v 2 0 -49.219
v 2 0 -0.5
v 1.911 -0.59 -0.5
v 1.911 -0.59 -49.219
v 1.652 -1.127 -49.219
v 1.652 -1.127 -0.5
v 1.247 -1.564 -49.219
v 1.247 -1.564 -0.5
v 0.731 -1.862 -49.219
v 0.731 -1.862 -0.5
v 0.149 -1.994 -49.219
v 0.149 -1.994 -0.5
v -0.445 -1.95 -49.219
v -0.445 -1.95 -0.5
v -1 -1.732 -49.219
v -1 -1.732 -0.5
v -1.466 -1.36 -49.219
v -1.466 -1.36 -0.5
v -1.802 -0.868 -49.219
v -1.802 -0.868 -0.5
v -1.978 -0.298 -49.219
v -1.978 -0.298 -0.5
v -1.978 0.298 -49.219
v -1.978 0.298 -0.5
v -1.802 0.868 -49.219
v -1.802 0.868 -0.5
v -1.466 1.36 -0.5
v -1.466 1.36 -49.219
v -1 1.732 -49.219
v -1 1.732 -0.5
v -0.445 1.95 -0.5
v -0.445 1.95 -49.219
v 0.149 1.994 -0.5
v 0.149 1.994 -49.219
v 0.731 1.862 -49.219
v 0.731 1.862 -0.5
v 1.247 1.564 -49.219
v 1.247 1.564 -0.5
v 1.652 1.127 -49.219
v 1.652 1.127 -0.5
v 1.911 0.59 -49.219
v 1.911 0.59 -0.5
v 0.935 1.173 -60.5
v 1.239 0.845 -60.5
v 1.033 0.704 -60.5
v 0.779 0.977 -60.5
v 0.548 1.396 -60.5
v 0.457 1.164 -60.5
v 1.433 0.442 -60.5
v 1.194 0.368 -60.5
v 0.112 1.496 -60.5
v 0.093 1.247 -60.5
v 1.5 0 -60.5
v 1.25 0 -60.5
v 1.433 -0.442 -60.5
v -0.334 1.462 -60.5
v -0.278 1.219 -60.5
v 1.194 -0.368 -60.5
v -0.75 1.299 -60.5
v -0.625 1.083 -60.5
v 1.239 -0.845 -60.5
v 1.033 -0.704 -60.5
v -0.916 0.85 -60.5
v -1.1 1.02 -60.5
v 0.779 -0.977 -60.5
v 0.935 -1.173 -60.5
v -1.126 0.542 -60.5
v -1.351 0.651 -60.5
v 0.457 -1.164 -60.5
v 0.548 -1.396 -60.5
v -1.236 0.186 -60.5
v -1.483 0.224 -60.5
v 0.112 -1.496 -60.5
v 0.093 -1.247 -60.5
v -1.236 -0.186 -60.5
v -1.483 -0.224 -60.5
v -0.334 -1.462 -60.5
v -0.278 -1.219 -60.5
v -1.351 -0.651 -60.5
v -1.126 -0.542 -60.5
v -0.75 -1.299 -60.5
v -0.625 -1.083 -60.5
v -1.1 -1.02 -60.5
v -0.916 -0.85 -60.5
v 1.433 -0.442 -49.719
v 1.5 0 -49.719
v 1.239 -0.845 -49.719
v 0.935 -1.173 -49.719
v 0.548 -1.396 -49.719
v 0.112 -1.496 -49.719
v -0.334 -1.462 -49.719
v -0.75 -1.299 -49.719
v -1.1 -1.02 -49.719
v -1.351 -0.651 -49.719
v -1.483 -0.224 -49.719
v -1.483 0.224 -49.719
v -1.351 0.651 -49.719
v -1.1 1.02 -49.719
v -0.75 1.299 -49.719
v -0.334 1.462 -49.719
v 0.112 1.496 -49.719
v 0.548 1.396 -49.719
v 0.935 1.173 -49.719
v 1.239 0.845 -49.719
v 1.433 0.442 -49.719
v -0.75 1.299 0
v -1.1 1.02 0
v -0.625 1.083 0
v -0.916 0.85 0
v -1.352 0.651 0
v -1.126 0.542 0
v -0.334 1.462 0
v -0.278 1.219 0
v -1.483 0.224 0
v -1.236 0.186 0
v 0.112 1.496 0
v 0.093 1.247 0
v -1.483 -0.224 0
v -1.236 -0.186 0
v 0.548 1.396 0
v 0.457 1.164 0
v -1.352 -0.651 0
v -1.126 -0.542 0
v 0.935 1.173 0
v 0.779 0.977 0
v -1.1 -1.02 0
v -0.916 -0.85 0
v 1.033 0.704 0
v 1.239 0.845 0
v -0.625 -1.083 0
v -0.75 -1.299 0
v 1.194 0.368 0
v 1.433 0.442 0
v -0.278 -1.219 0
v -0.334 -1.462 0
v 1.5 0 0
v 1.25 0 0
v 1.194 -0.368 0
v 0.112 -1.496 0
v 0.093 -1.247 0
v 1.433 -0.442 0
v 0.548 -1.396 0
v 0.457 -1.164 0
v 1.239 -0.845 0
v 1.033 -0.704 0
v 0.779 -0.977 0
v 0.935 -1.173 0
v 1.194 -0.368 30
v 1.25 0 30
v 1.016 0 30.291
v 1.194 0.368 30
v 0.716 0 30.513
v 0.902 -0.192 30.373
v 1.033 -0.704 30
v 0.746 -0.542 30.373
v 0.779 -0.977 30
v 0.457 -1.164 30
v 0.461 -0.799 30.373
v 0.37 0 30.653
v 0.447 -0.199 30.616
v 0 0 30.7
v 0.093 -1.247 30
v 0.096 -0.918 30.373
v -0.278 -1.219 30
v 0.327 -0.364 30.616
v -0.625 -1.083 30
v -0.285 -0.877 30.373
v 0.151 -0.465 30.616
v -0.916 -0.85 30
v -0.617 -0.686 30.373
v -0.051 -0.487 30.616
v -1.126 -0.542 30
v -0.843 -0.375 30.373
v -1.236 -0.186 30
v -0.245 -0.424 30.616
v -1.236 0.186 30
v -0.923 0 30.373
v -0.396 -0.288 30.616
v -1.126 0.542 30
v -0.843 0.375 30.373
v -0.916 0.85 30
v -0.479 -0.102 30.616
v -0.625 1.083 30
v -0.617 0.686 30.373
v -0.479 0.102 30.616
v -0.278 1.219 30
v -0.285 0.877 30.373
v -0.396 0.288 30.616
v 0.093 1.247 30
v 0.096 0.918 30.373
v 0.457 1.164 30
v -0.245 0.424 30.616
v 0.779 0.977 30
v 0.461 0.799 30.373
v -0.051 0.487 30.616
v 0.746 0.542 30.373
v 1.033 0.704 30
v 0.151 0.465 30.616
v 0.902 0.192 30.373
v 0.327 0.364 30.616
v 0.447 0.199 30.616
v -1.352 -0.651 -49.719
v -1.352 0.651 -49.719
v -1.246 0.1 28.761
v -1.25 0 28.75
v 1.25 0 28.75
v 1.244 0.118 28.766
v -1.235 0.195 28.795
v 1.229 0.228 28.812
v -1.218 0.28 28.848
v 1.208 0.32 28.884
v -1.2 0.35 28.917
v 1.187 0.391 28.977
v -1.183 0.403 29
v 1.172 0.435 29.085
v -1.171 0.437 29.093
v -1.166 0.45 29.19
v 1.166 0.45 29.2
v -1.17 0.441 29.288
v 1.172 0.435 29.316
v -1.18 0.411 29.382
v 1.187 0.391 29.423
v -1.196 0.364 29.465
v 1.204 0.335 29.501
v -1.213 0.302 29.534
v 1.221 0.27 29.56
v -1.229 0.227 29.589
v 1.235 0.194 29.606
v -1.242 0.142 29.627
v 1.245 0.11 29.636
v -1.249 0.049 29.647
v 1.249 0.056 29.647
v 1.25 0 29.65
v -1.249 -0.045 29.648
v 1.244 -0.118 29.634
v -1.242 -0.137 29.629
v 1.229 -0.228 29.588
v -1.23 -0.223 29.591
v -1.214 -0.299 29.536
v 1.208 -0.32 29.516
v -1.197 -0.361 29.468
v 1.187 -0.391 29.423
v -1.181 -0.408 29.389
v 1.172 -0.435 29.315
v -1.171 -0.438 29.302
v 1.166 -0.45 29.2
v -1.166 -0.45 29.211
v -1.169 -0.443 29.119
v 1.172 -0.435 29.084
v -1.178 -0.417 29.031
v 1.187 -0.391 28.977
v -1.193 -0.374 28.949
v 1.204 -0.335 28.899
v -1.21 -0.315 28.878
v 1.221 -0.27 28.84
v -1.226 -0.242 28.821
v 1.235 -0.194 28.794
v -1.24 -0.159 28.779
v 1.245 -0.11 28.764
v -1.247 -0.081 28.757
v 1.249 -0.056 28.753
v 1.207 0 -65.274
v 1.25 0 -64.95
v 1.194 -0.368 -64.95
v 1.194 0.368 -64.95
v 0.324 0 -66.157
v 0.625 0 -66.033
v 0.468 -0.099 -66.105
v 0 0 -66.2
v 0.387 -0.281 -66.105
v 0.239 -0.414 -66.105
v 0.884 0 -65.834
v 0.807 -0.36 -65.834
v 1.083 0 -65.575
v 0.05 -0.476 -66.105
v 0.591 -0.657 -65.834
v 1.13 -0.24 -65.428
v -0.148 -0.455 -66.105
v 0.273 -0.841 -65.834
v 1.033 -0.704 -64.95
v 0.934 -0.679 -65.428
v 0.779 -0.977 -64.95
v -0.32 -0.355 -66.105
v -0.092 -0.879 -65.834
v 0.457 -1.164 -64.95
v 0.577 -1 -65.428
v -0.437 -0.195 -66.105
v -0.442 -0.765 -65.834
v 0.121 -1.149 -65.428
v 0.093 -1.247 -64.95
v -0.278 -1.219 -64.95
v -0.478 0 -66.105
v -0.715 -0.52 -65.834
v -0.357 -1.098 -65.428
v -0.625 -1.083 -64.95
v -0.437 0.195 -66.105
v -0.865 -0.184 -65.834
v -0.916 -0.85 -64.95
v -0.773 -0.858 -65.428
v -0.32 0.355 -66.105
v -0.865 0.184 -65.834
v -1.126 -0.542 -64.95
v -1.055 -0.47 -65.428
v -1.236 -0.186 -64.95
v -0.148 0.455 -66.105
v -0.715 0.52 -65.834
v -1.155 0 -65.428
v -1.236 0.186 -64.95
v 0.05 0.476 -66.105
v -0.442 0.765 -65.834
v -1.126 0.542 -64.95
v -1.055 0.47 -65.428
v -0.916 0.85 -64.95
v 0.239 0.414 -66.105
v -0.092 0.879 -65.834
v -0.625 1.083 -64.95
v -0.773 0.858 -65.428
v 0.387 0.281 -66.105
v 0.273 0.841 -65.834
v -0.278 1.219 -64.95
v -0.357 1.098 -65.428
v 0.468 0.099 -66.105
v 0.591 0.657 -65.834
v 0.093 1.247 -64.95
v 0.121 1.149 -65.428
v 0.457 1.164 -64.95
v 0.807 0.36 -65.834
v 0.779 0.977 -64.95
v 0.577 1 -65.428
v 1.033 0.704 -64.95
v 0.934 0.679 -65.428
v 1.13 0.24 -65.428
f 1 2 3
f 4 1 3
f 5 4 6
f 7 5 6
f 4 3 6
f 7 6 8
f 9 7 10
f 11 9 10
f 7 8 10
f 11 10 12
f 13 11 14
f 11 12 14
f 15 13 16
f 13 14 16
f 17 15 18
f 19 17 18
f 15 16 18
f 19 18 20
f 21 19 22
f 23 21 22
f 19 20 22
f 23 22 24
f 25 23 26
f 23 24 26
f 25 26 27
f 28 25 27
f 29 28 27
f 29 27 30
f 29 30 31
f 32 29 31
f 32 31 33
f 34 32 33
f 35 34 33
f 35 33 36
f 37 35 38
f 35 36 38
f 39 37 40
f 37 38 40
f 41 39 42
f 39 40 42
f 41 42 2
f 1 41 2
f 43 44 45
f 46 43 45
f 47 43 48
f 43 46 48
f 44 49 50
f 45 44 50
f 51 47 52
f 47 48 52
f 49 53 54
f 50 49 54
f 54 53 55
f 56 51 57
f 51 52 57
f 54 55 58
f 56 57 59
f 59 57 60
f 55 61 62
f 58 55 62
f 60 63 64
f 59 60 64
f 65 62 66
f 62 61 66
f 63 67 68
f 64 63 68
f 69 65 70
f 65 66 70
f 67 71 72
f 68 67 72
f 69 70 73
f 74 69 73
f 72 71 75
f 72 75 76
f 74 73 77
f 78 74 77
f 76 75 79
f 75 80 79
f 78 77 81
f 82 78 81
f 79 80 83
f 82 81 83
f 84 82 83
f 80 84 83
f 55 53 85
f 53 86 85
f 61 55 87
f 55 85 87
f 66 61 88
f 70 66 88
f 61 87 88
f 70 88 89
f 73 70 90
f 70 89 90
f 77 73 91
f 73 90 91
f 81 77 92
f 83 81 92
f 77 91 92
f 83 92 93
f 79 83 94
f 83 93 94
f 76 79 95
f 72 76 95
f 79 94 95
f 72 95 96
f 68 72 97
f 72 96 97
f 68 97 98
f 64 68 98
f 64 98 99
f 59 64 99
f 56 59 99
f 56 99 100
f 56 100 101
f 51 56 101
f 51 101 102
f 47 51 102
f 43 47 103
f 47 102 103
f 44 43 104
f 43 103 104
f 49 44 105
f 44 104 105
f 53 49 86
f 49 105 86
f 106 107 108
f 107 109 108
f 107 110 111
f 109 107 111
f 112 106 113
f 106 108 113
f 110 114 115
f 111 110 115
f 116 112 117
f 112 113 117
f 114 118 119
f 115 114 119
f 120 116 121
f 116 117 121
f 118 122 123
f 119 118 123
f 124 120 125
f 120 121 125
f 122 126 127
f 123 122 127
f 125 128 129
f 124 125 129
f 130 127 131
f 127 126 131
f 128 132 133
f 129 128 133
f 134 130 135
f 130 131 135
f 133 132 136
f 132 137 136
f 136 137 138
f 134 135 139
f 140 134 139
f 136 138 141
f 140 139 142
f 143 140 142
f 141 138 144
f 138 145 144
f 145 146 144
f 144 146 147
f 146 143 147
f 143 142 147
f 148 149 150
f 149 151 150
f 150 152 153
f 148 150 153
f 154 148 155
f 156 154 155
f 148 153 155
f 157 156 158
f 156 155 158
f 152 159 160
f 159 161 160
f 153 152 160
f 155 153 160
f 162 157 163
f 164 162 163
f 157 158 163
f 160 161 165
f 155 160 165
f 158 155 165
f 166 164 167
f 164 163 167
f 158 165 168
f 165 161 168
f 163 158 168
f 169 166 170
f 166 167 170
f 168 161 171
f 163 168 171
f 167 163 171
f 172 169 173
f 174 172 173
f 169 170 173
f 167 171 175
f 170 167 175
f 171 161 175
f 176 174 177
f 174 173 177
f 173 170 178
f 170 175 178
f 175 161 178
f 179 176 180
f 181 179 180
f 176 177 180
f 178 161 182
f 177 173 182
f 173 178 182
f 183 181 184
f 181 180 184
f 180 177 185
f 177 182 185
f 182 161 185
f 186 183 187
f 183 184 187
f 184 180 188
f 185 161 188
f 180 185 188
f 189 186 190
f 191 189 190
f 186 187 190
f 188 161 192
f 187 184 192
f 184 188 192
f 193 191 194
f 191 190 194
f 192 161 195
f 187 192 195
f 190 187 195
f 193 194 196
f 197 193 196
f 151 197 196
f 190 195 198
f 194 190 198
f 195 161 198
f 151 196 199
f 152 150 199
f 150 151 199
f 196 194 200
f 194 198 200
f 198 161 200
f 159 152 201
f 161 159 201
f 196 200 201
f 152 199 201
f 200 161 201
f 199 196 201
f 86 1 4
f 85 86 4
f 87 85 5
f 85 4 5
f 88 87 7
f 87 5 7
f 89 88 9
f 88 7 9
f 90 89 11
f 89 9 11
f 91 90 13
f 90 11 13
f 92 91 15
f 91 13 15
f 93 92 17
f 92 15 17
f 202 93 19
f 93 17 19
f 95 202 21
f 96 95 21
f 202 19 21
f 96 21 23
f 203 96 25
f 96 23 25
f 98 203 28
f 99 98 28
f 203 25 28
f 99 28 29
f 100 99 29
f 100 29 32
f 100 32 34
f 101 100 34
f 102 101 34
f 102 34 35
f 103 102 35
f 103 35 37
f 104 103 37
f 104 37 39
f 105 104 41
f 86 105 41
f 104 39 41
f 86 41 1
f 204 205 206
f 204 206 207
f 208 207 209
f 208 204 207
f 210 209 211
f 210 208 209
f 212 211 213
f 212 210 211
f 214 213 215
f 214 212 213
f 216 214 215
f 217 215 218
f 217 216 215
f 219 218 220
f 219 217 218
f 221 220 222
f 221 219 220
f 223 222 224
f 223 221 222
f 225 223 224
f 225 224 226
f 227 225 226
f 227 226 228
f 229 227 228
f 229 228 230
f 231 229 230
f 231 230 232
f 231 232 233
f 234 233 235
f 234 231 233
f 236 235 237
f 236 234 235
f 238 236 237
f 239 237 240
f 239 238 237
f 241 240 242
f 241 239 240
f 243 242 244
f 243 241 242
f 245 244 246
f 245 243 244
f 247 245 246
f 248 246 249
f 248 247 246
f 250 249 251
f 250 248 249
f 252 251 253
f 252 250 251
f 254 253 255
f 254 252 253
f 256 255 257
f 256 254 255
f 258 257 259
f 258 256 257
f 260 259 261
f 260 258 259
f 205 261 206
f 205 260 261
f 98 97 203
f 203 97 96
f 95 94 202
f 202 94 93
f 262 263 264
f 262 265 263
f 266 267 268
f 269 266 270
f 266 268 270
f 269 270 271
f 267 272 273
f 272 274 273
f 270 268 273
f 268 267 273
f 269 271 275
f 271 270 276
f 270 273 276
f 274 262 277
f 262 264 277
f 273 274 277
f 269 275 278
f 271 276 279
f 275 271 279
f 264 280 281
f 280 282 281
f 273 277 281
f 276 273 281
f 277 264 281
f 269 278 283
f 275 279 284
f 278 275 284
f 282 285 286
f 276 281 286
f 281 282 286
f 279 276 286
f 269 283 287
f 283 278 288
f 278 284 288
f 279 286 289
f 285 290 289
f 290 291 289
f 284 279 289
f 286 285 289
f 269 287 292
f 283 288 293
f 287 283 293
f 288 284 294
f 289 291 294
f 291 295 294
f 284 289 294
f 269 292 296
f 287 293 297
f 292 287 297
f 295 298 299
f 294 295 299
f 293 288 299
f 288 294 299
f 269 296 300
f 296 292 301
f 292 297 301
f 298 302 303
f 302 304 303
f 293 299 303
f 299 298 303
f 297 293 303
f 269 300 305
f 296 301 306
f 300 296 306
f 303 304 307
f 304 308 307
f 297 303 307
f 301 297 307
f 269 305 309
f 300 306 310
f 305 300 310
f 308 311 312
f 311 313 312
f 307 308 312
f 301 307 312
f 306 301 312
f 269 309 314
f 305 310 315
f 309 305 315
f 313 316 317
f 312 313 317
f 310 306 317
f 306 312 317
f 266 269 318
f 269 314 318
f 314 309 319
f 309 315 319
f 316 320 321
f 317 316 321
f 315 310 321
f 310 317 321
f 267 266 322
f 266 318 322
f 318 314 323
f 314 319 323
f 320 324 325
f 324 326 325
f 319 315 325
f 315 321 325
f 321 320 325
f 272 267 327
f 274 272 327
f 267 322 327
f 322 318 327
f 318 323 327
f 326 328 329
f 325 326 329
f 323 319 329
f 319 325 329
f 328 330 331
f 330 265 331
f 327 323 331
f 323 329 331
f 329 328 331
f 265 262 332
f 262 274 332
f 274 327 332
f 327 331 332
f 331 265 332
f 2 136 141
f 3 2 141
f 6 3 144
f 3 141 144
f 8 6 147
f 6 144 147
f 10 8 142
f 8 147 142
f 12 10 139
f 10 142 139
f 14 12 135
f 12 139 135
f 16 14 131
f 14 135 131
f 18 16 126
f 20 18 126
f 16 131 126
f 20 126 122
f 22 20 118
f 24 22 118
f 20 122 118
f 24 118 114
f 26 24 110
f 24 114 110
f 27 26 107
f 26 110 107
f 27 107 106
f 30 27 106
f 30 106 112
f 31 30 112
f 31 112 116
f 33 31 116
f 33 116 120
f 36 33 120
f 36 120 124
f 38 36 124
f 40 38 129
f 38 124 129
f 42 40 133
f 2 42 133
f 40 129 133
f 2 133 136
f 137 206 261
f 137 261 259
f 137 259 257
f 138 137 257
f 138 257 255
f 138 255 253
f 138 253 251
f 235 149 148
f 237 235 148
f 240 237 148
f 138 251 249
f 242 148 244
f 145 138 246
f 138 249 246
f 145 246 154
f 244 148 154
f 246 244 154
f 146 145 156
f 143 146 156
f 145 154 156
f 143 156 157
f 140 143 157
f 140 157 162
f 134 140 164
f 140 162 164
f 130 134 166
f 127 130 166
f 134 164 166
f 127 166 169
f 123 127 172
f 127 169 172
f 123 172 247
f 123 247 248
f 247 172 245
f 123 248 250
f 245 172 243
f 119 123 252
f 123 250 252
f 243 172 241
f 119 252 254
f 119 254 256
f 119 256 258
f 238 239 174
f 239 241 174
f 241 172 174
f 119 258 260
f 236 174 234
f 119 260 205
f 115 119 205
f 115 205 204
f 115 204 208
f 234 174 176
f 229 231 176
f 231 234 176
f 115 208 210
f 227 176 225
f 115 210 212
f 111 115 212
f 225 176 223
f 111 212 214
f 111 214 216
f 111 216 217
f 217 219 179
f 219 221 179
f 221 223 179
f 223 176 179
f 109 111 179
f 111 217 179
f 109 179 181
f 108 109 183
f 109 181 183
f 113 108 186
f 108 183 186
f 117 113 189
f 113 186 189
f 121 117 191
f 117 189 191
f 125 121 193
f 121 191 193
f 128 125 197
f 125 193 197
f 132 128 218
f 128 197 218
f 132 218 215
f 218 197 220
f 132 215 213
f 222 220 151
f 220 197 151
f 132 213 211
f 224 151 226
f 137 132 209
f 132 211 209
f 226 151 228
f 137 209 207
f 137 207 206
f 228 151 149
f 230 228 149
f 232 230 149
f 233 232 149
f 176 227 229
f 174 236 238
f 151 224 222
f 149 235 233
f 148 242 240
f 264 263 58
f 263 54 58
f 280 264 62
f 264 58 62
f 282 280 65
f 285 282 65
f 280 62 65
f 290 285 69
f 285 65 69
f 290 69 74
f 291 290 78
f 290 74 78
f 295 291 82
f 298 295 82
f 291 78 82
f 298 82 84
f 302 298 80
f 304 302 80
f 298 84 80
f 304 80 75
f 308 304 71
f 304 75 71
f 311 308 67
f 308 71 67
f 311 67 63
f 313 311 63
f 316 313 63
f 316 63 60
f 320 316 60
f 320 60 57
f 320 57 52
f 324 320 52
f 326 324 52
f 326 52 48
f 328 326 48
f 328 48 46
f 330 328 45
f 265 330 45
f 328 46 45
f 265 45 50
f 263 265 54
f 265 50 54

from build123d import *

# Parameters (mm, degrees)
CHAMFER1_SIZE           = 0.5
CUT_EXTRUDE1_DEPTH      = 67.260395411
CUT_EXTRUDE1_DEPTH_BACK = 67.260395411
SKETCH3_R               = 0.45


with BuildPart() as part:
    # Sketch2 → Revolve1 (revolve)
    with BuildSketch(Plane(origin=(0, 0, 0), x_dir=(0, 0, -1), z_dir=(1, 0, 0)), mode=Mode.PRIVATE) as revolve1_sk:
        with BuildLine():
            Line((-29.233928571, 0), (65.5, 0))
            Line((65.5, 0), (66.2, 0))
            ThreePointArc((66.2, 0), (65.833883476, -0.883883476), (64.95, -1.25))
            Line((64.95, -1.25), (60.5, -1.25))
            Line((60.5, -1.25), (60.5, -1.5))
            Line((60.5, -1.5), (49.719225947, -1.5))
            Line((49.719225947, -1.5), (49.719225947, -2))
            Line((49.719225947, -2), (0, -2))
            Line((0, -2), (0, -1.25))
            Line((0, -1.25), (-5, -1.25))
            Line((-5, -1.25), (-30, -1.25))
            ThreePointArc((-30, -1.25), (-30.513084713, -0.716327439), (-30.7, 0))
            Line((-30.7, 0), (-29.233928571, 0))
        make_face()
    revolve(revolve1_sk.sketch.rotate(Axis((0, 0, 29.233928571), (0, 0, -1)), 270), axis=Axis((0, 0, 29.233928571), (0, 0, -1)))

    # Chamfer1
    chamfer1_edges = [part.edges().sort_by_distance(p)[0] for p in [
        (-2, 0, -49.719225947),
        (-2, 0, 0),
    ]]
    chamfer(chamfer1_edges, length=CHAMFER1_SIZE - 0.0001)  # a hair under: the kernel refuses the full size

    # Sketch3 → Cut-Extrude1 (cut, two sides: drawn at the far end of the back side and taken through both)
    with BuildSketch(Plane(origin=(0, 0, 0), x_dir=(0, 0, -1), z_dir=(1, 0, 0)).offset(-CUT_EXTRUDE1_DEPTH_BACK)):
        with Locations((-29.2, 0)):
            Circle(SKETCH3_R)
    extrude(amount=CUT_EXTRUDE1_DEPTH + CUT_EXTRUDE1_DEPTH_BACK, mode=Mode.SUBTRACT)


solid = part.part
